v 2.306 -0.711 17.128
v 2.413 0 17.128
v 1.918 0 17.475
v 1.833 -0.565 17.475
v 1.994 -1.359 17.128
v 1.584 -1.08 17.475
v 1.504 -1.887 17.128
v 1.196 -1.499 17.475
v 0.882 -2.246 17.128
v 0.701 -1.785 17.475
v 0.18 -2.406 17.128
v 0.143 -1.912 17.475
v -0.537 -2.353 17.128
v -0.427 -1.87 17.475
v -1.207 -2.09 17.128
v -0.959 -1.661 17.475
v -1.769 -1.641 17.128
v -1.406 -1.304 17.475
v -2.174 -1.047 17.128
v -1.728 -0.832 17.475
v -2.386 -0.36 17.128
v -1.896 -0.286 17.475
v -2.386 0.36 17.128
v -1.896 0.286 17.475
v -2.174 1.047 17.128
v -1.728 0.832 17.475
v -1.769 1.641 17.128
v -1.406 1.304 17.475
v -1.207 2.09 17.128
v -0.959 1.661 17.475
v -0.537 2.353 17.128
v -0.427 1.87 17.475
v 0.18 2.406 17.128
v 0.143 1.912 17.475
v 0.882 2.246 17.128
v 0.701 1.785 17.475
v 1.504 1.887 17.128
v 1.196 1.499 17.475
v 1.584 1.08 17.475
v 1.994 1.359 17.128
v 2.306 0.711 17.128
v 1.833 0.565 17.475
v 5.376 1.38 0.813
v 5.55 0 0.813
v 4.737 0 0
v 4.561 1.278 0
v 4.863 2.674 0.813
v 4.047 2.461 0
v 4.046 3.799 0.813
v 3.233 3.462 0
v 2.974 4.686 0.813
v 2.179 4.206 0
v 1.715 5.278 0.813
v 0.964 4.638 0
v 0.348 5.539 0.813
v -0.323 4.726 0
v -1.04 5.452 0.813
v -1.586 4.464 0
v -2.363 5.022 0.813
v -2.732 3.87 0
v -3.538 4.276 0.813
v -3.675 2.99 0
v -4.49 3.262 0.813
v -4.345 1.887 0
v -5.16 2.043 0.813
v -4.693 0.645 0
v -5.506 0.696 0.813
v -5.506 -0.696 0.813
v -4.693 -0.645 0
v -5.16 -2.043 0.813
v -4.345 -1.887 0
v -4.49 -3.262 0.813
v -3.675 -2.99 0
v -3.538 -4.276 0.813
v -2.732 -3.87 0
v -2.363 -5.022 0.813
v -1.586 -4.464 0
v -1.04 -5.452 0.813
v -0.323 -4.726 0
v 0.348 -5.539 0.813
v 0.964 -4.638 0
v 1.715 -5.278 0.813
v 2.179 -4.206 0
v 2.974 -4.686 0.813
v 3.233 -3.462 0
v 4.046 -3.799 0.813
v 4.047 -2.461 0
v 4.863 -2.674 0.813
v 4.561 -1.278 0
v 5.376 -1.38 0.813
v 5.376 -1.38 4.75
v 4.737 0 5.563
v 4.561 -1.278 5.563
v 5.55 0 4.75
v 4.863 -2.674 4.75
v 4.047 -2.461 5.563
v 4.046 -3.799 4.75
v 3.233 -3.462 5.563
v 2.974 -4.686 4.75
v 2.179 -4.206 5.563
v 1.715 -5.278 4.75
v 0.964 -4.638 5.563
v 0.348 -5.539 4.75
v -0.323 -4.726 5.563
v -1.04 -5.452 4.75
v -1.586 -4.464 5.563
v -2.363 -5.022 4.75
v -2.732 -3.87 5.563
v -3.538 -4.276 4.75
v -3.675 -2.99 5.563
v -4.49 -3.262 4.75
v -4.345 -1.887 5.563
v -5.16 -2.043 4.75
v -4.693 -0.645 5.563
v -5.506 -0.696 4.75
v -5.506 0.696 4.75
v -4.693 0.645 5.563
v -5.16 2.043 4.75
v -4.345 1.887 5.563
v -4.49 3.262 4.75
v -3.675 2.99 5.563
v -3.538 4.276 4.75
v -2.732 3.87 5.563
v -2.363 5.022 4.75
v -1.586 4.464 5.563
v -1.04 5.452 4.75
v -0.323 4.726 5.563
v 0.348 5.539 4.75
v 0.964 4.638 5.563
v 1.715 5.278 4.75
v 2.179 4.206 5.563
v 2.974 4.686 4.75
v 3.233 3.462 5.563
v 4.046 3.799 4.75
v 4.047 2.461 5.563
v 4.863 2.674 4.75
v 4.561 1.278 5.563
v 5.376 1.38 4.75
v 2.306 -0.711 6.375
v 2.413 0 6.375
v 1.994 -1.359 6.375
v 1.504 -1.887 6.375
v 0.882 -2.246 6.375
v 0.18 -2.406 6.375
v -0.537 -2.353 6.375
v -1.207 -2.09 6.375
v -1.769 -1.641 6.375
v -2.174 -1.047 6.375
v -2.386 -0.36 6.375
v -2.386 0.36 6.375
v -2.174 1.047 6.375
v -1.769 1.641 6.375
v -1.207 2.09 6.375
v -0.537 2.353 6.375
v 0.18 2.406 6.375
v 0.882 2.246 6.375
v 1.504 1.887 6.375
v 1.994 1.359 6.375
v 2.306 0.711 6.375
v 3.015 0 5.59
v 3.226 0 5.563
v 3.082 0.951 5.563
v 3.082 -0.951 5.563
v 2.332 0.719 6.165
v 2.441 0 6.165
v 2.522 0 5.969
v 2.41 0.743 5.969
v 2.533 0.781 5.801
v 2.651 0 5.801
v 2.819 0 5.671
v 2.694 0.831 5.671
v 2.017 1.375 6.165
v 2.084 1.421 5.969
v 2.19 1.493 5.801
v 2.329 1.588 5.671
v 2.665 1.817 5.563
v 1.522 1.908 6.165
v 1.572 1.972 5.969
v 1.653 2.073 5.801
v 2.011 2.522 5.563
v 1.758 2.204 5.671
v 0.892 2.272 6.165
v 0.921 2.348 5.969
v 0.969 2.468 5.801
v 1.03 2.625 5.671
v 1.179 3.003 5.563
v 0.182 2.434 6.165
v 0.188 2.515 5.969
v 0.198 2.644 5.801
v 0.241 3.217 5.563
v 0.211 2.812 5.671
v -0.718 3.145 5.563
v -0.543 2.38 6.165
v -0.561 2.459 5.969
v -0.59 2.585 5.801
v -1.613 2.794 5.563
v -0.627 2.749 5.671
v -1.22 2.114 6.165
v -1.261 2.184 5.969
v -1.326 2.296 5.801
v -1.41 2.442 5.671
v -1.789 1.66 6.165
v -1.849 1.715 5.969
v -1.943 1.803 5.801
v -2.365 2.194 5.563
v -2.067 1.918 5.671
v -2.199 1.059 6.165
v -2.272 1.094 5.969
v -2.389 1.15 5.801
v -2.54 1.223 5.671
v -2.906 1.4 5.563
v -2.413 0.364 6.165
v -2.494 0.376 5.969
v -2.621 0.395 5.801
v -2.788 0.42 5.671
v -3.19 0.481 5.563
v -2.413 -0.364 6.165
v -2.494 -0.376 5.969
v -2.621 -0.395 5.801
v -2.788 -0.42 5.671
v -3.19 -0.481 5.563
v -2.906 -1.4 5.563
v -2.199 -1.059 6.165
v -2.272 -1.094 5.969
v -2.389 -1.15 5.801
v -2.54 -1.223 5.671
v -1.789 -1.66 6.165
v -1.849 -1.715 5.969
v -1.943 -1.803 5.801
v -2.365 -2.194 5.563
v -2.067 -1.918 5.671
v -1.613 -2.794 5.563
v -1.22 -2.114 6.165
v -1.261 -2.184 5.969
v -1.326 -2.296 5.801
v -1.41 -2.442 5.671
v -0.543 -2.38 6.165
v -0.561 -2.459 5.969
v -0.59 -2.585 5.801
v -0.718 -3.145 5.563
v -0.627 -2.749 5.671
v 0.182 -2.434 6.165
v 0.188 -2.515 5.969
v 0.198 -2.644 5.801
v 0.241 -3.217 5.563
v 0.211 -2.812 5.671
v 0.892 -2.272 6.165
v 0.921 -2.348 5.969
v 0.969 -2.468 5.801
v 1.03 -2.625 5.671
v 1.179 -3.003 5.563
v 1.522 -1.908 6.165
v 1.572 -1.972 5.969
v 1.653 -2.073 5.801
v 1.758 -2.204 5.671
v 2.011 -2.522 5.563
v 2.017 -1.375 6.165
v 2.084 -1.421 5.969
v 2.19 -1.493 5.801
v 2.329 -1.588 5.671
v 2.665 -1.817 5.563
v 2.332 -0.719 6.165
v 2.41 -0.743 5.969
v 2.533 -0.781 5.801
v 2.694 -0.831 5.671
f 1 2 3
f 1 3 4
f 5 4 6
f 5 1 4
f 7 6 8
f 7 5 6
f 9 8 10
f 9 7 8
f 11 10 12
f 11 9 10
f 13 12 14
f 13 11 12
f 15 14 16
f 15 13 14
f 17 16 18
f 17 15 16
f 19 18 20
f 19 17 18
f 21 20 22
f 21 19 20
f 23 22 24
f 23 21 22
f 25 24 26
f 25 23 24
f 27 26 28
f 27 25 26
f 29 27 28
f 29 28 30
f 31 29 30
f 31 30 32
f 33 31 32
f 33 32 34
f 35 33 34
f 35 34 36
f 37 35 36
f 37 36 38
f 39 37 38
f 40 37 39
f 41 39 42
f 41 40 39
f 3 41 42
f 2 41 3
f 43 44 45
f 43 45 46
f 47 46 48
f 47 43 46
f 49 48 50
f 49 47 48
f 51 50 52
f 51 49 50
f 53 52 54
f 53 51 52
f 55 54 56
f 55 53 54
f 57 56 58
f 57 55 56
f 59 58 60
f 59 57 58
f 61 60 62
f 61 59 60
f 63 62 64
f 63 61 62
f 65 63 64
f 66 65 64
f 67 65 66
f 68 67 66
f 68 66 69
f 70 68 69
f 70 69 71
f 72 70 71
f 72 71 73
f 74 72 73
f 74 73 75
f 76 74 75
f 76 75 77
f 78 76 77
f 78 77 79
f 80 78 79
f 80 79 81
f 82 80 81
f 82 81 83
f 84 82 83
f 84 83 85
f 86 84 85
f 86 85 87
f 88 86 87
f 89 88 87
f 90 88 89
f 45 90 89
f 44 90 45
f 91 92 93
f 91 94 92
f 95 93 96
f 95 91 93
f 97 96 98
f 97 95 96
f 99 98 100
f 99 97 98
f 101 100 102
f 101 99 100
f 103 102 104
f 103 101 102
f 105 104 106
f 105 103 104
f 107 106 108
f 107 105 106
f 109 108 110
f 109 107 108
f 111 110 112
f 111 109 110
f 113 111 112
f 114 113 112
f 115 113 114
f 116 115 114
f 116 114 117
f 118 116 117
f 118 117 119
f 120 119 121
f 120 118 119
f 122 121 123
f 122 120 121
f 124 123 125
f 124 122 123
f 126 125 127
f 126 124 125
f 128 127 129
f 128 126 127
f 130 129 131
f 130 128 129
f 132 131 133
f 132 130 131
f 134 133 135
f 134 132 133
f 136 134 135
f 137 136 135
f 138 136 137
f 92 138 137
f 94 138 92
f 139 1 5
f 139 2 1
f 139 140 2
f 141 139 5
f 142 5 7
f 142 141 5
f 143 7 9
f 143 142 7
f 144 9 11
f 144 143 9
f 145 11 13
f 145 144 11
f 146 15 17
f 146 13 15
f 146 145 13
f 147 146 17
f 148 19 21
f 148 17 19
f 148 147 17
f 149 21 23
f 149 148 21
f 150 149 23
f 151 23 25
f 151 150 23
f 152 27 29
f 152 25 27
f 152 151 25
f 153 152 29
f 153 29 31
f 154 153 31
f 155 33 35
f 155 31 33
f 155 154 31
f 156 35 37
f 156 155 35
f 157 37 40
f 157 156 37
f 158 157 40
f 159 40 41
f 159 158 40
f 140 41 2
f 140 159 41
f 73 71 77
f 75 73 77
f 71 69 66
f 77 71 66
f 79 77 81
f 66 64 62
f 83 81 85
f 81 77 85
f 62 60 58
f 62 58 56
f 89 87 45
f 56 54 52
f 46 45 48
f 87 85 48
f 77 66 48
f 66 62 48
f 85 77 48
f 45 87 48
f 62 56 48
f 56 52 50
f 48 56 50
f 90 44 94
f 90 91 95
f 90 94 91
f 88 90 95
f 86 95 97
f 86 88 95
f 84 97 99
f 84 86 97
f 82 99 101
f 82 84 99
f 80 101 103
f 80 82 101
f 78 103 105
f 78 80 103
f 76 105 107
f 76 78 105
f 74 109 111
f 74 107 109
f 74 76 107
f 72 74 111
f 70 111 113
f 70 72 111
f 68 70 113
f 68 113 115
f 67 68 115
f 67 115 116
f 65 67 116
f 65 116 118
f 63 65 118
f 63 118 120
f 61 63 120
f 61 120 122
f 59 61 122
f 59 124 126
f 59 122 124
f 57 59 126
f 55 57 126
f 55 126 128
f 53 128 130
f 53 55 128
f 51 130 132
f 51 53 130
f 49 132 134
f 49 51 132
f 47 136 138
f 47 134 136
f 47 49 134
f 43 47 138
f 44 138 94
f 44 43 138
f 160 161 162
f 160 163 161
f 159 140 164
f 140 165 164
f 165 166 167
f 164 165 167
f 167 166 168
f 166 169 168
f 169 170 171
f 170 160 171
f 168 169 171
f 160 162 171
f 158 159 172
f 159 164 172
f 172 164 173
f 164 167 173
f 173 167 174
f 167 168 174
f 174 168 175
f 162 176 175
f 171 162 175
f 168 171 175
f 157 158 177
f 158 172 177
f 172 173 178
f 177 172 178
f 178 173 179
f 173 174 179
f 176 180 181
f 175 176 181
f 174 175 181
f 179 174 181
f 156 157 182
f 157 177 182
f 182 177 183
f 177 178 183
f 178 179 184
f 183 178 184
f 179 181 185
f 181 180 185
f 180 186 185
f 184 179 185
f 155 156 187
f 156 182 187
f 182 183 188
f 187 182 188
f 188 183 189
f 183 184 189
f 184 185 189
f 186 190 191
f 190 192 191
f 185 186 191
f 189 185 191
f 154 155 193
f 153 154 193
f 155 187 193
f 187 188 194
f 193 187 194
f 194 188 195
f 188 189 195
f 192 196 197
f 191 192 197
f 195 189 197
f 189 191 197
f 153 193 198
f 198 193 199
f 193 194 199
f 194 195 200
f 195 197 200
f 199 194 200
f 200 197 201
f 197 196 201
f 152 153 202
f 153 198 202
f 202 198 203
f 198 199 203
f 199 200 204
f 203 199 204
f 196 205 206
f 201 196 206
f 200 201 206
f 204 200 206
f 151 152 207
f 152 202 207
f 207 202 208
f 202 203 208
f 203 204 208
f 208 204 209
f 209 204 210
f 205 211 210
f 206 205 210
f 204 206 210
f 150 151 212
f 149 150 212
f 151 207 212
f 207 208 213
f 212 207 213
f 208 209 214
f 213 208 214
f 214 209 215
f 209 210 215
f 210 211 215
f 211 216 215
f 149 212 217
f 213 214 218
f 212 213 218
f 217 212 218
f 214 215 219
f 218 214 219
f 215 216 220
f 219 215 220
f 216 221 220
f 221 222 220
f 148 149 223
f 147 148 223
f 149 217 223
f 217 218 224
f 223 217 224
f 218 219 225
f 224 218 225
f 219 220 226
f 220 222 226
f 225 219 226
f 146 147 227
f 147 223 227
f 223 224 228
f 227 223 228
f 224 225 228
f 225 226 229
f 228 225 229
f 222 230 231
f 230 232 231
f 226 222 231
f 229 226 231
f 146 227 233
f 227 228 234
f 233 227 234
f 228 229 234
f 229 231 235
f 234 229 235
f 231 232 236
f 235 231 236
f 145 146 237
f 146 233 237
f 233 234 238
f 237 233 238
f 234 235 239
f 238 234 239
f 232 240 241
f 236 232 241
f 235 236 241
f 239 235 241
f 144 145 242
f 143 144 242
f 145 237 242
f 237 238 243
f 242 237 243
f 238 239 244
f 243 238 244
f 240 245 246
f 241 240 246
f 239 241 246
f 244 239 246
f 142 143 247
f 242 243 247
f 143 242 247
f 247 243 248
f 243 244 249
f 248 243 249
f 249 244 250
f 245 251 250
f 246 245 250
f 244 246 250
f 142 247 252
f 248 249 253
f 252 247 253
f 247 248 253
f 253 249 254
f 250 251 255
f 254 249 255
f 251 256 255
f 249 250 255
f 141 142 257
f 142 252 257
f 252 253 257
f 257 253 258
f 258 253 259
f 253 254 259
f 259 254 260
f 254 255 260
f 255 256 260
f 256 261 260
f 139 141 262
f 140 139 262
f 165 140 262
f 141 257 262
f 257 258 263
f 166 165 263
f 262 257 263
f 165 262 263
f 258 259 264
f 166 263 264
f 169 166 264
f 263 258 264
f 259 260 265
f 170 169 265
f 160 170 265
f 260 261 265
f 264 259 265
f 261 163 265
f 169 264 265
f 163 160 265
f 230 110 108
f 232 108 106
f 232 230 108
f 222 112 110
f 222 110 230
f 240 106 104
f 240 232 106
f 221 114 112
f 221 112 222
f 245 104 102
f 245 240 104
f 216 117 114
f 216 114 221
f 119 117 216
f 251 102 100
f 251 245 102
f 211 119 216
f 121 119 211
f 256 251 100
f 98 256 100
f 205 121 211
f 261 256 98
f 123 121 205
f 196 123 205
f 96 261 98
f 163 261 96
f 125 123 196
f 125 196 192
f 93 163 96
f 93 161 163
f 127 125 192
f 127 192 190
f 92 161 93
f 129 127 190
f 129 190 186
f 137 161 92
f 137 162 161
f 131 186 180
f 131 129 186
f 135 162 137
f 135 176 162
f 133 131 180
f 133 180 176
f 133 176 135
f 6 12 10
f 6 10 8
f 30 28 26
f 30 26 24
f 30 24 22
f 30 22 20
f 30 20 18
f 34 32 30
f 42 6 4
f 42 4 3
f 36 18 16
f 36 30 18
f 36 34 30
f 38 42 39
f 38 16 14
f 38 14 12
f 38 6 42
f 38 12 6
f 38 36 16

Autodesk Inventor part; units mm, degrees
ref_plane "YZ Plane" through (0, 0, 0) normal (1, 0, 0) x (0, 1, 0)
ref_plane "XZ Plane" through (0, 0, 0) normal (0, 1, 0) x (-1, 0, 0)
ref_plane "XY Plane" through (0, 0, 0) normal (0, 0, 1) x (1, 0, 0)
sketch "Sketch2" plane through (0, 0, 0) normal (0, 0, 1) x (1, 0, 0)
  circle A0 centre (0, 0) radius 5.5499
  dimension "d3" = 11.0998
extrude "Extrusion2" add sketch "Sketch2" along normal blind 5.5626
sketch "Sketch3" plane through (0, 0, 5.5626) normal (0, 0, 1) x (1, 0, 0)
  circle A0 centre (0, 0) radius 2.413
  dimension "d6" = 4.826
extrude "Extrusion3" add sketch "Sketch3" along normal blind 11.9126
chamfer "Chamfer1" distance 0.4953 angle 35 1 edges at (-2.413, 0, 17.4752) measured on face at (0.8911, -0.3521, 17.4752)
thread "Thread1" size "10-24 UNC" class "2A" standard "ANSI Unified Screw Threads" full length
fillet "Fillet1" radius 0.8128 1 edges at (-2.413, 0, 5.5626)
chamfer "Chamfer2" distance 0.8128 angle 45 1 edges at (-5.5499, 0, 5.5626) measured on face at (4.7214, -0.4427, 5.5626)
chamfer "Chamfer3" distance 0.8128 angle 45 1 edges at (-5.5499, 0, 0) measured on face at (1.9719, 1.8895, 0)
properties part number "13_2"
